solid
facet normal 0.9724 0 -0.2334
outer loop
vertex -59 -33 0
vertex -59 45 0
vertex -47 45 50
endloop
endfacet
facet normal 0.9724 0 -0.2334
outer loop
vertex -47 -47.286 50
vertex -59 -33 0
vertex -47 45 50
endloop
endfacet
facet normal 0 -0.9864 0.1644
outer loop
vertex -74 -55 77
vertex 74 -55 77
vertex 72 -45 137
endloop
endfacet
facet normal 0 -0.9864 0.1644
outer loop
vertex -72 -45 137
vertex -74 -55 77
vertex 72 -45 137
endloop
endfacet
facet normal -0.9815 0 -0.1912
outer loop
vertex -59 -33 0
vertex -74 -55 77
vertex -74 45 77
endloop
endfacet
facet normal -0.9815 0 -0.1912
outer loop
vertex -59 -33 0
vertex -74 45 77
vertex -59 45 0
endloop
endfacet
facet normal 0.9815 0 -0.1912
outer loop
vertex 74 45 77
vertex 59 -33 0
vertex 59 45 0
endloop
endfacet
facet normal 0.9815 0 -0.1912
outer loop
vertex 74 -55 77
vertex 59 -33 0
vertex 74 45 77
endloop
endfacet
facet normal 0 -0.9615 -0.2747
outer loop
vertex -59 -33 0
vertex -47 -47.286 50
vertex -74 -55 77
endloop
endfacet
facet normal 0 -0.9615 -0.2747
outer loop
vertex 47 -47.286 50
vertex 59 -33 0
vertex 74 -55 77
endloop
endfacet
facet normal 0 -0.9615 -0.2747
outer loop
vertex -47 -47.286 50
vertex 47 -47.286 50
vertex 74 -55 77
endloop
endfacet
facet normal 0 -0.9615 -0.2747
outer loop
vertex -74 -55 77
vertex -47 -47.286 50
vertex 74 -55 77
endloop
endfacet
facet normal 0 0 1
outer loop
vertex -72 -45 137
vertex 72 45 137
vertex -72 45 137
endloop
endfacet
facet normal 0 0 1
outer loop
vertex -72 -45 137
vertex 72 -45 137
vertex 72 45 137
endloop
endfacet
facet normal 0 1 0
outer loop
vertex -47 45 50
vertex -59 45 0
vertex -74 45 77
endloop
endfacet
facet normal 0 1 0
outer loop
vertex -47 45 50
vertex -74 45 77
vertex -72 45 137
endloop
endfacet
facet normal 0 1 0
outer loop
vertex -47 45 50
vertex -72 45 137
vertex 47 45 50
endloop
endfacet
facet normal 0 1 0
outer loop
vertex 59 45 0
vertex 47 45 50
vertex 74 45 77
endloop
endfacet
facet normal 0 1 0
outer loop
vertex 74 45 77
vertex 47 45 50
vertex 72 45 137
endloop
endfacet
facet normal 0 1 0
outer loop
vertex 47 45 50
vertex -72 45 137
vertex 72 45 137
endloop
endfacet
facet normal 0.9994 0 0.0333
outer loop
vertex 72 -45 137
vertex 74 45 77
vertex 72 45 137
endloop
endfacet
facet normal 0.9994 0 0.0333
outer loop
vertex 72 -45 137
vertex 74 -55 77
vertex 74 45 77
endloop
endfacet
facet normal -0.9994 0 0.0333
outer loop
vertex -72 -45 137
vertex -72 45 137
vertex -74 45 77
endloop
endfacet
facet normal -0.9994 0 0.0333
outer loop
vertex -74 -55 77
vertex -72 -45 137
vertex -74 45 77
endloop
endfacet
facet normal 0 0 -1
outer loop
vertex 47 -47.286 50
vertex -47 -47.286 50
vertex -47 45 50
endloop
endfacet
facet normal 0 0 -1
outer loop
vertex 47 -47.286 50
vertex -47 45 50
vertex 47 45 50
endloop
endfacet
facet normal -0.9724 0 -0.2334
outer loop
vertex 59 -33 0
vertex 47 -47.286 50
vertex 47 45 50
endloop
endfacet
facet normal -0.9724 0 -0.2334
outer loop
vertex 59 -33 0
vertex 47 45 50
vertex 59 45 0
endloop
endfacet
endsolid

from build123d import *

# Parameters (mm, degrees)
F2_DEPTH      = 55
F3_DEPTH      = 74.001
F3_DEPTH_BACK = 74.001
F4_DEPTH      = 45


with BuildPart() as f2:
    # F0 (on Front) → F2 (new body, through all)
    with BuildSketch(Plane.XZ):
        Polygon((-72, 137), (-74, 77), (0, 77), (74, 77), (72, 137), (0, 137), align=None)
        Polygon((-74, 77), (-59, 0), (-47, 50), (0, 50), (47, 50), (59, 0), (74, 77), (0, 77), align=None)
    extrude(amount=F2_DEPTH)

    # F1 (on Right) → F3 (cut, two sides)
    with BuildSketch(Plane.YZ) as f3_sk:
        Polygon((-55, 77), (-45, 137), (-80.7239860296, 137), (-80.7239860296, 0), (-33, 0), align=None)
    extrude(amount=-F3_DEPTH, mode=Mode.SUBTRACT)
    extrude(f3_sk.sketch, amount=F3_DEPTH_BACK, mode=Mode.SUBTRACT)

    # F4 (add): a face of the model
    f4_faces = [f2.faces().sort_by_distance(p)[0] for p in [
        (0, 0, 88.8782570615),
    ]]
    extrude(f4_faces, amount=F4_DEPTH)


solid = f2.part
